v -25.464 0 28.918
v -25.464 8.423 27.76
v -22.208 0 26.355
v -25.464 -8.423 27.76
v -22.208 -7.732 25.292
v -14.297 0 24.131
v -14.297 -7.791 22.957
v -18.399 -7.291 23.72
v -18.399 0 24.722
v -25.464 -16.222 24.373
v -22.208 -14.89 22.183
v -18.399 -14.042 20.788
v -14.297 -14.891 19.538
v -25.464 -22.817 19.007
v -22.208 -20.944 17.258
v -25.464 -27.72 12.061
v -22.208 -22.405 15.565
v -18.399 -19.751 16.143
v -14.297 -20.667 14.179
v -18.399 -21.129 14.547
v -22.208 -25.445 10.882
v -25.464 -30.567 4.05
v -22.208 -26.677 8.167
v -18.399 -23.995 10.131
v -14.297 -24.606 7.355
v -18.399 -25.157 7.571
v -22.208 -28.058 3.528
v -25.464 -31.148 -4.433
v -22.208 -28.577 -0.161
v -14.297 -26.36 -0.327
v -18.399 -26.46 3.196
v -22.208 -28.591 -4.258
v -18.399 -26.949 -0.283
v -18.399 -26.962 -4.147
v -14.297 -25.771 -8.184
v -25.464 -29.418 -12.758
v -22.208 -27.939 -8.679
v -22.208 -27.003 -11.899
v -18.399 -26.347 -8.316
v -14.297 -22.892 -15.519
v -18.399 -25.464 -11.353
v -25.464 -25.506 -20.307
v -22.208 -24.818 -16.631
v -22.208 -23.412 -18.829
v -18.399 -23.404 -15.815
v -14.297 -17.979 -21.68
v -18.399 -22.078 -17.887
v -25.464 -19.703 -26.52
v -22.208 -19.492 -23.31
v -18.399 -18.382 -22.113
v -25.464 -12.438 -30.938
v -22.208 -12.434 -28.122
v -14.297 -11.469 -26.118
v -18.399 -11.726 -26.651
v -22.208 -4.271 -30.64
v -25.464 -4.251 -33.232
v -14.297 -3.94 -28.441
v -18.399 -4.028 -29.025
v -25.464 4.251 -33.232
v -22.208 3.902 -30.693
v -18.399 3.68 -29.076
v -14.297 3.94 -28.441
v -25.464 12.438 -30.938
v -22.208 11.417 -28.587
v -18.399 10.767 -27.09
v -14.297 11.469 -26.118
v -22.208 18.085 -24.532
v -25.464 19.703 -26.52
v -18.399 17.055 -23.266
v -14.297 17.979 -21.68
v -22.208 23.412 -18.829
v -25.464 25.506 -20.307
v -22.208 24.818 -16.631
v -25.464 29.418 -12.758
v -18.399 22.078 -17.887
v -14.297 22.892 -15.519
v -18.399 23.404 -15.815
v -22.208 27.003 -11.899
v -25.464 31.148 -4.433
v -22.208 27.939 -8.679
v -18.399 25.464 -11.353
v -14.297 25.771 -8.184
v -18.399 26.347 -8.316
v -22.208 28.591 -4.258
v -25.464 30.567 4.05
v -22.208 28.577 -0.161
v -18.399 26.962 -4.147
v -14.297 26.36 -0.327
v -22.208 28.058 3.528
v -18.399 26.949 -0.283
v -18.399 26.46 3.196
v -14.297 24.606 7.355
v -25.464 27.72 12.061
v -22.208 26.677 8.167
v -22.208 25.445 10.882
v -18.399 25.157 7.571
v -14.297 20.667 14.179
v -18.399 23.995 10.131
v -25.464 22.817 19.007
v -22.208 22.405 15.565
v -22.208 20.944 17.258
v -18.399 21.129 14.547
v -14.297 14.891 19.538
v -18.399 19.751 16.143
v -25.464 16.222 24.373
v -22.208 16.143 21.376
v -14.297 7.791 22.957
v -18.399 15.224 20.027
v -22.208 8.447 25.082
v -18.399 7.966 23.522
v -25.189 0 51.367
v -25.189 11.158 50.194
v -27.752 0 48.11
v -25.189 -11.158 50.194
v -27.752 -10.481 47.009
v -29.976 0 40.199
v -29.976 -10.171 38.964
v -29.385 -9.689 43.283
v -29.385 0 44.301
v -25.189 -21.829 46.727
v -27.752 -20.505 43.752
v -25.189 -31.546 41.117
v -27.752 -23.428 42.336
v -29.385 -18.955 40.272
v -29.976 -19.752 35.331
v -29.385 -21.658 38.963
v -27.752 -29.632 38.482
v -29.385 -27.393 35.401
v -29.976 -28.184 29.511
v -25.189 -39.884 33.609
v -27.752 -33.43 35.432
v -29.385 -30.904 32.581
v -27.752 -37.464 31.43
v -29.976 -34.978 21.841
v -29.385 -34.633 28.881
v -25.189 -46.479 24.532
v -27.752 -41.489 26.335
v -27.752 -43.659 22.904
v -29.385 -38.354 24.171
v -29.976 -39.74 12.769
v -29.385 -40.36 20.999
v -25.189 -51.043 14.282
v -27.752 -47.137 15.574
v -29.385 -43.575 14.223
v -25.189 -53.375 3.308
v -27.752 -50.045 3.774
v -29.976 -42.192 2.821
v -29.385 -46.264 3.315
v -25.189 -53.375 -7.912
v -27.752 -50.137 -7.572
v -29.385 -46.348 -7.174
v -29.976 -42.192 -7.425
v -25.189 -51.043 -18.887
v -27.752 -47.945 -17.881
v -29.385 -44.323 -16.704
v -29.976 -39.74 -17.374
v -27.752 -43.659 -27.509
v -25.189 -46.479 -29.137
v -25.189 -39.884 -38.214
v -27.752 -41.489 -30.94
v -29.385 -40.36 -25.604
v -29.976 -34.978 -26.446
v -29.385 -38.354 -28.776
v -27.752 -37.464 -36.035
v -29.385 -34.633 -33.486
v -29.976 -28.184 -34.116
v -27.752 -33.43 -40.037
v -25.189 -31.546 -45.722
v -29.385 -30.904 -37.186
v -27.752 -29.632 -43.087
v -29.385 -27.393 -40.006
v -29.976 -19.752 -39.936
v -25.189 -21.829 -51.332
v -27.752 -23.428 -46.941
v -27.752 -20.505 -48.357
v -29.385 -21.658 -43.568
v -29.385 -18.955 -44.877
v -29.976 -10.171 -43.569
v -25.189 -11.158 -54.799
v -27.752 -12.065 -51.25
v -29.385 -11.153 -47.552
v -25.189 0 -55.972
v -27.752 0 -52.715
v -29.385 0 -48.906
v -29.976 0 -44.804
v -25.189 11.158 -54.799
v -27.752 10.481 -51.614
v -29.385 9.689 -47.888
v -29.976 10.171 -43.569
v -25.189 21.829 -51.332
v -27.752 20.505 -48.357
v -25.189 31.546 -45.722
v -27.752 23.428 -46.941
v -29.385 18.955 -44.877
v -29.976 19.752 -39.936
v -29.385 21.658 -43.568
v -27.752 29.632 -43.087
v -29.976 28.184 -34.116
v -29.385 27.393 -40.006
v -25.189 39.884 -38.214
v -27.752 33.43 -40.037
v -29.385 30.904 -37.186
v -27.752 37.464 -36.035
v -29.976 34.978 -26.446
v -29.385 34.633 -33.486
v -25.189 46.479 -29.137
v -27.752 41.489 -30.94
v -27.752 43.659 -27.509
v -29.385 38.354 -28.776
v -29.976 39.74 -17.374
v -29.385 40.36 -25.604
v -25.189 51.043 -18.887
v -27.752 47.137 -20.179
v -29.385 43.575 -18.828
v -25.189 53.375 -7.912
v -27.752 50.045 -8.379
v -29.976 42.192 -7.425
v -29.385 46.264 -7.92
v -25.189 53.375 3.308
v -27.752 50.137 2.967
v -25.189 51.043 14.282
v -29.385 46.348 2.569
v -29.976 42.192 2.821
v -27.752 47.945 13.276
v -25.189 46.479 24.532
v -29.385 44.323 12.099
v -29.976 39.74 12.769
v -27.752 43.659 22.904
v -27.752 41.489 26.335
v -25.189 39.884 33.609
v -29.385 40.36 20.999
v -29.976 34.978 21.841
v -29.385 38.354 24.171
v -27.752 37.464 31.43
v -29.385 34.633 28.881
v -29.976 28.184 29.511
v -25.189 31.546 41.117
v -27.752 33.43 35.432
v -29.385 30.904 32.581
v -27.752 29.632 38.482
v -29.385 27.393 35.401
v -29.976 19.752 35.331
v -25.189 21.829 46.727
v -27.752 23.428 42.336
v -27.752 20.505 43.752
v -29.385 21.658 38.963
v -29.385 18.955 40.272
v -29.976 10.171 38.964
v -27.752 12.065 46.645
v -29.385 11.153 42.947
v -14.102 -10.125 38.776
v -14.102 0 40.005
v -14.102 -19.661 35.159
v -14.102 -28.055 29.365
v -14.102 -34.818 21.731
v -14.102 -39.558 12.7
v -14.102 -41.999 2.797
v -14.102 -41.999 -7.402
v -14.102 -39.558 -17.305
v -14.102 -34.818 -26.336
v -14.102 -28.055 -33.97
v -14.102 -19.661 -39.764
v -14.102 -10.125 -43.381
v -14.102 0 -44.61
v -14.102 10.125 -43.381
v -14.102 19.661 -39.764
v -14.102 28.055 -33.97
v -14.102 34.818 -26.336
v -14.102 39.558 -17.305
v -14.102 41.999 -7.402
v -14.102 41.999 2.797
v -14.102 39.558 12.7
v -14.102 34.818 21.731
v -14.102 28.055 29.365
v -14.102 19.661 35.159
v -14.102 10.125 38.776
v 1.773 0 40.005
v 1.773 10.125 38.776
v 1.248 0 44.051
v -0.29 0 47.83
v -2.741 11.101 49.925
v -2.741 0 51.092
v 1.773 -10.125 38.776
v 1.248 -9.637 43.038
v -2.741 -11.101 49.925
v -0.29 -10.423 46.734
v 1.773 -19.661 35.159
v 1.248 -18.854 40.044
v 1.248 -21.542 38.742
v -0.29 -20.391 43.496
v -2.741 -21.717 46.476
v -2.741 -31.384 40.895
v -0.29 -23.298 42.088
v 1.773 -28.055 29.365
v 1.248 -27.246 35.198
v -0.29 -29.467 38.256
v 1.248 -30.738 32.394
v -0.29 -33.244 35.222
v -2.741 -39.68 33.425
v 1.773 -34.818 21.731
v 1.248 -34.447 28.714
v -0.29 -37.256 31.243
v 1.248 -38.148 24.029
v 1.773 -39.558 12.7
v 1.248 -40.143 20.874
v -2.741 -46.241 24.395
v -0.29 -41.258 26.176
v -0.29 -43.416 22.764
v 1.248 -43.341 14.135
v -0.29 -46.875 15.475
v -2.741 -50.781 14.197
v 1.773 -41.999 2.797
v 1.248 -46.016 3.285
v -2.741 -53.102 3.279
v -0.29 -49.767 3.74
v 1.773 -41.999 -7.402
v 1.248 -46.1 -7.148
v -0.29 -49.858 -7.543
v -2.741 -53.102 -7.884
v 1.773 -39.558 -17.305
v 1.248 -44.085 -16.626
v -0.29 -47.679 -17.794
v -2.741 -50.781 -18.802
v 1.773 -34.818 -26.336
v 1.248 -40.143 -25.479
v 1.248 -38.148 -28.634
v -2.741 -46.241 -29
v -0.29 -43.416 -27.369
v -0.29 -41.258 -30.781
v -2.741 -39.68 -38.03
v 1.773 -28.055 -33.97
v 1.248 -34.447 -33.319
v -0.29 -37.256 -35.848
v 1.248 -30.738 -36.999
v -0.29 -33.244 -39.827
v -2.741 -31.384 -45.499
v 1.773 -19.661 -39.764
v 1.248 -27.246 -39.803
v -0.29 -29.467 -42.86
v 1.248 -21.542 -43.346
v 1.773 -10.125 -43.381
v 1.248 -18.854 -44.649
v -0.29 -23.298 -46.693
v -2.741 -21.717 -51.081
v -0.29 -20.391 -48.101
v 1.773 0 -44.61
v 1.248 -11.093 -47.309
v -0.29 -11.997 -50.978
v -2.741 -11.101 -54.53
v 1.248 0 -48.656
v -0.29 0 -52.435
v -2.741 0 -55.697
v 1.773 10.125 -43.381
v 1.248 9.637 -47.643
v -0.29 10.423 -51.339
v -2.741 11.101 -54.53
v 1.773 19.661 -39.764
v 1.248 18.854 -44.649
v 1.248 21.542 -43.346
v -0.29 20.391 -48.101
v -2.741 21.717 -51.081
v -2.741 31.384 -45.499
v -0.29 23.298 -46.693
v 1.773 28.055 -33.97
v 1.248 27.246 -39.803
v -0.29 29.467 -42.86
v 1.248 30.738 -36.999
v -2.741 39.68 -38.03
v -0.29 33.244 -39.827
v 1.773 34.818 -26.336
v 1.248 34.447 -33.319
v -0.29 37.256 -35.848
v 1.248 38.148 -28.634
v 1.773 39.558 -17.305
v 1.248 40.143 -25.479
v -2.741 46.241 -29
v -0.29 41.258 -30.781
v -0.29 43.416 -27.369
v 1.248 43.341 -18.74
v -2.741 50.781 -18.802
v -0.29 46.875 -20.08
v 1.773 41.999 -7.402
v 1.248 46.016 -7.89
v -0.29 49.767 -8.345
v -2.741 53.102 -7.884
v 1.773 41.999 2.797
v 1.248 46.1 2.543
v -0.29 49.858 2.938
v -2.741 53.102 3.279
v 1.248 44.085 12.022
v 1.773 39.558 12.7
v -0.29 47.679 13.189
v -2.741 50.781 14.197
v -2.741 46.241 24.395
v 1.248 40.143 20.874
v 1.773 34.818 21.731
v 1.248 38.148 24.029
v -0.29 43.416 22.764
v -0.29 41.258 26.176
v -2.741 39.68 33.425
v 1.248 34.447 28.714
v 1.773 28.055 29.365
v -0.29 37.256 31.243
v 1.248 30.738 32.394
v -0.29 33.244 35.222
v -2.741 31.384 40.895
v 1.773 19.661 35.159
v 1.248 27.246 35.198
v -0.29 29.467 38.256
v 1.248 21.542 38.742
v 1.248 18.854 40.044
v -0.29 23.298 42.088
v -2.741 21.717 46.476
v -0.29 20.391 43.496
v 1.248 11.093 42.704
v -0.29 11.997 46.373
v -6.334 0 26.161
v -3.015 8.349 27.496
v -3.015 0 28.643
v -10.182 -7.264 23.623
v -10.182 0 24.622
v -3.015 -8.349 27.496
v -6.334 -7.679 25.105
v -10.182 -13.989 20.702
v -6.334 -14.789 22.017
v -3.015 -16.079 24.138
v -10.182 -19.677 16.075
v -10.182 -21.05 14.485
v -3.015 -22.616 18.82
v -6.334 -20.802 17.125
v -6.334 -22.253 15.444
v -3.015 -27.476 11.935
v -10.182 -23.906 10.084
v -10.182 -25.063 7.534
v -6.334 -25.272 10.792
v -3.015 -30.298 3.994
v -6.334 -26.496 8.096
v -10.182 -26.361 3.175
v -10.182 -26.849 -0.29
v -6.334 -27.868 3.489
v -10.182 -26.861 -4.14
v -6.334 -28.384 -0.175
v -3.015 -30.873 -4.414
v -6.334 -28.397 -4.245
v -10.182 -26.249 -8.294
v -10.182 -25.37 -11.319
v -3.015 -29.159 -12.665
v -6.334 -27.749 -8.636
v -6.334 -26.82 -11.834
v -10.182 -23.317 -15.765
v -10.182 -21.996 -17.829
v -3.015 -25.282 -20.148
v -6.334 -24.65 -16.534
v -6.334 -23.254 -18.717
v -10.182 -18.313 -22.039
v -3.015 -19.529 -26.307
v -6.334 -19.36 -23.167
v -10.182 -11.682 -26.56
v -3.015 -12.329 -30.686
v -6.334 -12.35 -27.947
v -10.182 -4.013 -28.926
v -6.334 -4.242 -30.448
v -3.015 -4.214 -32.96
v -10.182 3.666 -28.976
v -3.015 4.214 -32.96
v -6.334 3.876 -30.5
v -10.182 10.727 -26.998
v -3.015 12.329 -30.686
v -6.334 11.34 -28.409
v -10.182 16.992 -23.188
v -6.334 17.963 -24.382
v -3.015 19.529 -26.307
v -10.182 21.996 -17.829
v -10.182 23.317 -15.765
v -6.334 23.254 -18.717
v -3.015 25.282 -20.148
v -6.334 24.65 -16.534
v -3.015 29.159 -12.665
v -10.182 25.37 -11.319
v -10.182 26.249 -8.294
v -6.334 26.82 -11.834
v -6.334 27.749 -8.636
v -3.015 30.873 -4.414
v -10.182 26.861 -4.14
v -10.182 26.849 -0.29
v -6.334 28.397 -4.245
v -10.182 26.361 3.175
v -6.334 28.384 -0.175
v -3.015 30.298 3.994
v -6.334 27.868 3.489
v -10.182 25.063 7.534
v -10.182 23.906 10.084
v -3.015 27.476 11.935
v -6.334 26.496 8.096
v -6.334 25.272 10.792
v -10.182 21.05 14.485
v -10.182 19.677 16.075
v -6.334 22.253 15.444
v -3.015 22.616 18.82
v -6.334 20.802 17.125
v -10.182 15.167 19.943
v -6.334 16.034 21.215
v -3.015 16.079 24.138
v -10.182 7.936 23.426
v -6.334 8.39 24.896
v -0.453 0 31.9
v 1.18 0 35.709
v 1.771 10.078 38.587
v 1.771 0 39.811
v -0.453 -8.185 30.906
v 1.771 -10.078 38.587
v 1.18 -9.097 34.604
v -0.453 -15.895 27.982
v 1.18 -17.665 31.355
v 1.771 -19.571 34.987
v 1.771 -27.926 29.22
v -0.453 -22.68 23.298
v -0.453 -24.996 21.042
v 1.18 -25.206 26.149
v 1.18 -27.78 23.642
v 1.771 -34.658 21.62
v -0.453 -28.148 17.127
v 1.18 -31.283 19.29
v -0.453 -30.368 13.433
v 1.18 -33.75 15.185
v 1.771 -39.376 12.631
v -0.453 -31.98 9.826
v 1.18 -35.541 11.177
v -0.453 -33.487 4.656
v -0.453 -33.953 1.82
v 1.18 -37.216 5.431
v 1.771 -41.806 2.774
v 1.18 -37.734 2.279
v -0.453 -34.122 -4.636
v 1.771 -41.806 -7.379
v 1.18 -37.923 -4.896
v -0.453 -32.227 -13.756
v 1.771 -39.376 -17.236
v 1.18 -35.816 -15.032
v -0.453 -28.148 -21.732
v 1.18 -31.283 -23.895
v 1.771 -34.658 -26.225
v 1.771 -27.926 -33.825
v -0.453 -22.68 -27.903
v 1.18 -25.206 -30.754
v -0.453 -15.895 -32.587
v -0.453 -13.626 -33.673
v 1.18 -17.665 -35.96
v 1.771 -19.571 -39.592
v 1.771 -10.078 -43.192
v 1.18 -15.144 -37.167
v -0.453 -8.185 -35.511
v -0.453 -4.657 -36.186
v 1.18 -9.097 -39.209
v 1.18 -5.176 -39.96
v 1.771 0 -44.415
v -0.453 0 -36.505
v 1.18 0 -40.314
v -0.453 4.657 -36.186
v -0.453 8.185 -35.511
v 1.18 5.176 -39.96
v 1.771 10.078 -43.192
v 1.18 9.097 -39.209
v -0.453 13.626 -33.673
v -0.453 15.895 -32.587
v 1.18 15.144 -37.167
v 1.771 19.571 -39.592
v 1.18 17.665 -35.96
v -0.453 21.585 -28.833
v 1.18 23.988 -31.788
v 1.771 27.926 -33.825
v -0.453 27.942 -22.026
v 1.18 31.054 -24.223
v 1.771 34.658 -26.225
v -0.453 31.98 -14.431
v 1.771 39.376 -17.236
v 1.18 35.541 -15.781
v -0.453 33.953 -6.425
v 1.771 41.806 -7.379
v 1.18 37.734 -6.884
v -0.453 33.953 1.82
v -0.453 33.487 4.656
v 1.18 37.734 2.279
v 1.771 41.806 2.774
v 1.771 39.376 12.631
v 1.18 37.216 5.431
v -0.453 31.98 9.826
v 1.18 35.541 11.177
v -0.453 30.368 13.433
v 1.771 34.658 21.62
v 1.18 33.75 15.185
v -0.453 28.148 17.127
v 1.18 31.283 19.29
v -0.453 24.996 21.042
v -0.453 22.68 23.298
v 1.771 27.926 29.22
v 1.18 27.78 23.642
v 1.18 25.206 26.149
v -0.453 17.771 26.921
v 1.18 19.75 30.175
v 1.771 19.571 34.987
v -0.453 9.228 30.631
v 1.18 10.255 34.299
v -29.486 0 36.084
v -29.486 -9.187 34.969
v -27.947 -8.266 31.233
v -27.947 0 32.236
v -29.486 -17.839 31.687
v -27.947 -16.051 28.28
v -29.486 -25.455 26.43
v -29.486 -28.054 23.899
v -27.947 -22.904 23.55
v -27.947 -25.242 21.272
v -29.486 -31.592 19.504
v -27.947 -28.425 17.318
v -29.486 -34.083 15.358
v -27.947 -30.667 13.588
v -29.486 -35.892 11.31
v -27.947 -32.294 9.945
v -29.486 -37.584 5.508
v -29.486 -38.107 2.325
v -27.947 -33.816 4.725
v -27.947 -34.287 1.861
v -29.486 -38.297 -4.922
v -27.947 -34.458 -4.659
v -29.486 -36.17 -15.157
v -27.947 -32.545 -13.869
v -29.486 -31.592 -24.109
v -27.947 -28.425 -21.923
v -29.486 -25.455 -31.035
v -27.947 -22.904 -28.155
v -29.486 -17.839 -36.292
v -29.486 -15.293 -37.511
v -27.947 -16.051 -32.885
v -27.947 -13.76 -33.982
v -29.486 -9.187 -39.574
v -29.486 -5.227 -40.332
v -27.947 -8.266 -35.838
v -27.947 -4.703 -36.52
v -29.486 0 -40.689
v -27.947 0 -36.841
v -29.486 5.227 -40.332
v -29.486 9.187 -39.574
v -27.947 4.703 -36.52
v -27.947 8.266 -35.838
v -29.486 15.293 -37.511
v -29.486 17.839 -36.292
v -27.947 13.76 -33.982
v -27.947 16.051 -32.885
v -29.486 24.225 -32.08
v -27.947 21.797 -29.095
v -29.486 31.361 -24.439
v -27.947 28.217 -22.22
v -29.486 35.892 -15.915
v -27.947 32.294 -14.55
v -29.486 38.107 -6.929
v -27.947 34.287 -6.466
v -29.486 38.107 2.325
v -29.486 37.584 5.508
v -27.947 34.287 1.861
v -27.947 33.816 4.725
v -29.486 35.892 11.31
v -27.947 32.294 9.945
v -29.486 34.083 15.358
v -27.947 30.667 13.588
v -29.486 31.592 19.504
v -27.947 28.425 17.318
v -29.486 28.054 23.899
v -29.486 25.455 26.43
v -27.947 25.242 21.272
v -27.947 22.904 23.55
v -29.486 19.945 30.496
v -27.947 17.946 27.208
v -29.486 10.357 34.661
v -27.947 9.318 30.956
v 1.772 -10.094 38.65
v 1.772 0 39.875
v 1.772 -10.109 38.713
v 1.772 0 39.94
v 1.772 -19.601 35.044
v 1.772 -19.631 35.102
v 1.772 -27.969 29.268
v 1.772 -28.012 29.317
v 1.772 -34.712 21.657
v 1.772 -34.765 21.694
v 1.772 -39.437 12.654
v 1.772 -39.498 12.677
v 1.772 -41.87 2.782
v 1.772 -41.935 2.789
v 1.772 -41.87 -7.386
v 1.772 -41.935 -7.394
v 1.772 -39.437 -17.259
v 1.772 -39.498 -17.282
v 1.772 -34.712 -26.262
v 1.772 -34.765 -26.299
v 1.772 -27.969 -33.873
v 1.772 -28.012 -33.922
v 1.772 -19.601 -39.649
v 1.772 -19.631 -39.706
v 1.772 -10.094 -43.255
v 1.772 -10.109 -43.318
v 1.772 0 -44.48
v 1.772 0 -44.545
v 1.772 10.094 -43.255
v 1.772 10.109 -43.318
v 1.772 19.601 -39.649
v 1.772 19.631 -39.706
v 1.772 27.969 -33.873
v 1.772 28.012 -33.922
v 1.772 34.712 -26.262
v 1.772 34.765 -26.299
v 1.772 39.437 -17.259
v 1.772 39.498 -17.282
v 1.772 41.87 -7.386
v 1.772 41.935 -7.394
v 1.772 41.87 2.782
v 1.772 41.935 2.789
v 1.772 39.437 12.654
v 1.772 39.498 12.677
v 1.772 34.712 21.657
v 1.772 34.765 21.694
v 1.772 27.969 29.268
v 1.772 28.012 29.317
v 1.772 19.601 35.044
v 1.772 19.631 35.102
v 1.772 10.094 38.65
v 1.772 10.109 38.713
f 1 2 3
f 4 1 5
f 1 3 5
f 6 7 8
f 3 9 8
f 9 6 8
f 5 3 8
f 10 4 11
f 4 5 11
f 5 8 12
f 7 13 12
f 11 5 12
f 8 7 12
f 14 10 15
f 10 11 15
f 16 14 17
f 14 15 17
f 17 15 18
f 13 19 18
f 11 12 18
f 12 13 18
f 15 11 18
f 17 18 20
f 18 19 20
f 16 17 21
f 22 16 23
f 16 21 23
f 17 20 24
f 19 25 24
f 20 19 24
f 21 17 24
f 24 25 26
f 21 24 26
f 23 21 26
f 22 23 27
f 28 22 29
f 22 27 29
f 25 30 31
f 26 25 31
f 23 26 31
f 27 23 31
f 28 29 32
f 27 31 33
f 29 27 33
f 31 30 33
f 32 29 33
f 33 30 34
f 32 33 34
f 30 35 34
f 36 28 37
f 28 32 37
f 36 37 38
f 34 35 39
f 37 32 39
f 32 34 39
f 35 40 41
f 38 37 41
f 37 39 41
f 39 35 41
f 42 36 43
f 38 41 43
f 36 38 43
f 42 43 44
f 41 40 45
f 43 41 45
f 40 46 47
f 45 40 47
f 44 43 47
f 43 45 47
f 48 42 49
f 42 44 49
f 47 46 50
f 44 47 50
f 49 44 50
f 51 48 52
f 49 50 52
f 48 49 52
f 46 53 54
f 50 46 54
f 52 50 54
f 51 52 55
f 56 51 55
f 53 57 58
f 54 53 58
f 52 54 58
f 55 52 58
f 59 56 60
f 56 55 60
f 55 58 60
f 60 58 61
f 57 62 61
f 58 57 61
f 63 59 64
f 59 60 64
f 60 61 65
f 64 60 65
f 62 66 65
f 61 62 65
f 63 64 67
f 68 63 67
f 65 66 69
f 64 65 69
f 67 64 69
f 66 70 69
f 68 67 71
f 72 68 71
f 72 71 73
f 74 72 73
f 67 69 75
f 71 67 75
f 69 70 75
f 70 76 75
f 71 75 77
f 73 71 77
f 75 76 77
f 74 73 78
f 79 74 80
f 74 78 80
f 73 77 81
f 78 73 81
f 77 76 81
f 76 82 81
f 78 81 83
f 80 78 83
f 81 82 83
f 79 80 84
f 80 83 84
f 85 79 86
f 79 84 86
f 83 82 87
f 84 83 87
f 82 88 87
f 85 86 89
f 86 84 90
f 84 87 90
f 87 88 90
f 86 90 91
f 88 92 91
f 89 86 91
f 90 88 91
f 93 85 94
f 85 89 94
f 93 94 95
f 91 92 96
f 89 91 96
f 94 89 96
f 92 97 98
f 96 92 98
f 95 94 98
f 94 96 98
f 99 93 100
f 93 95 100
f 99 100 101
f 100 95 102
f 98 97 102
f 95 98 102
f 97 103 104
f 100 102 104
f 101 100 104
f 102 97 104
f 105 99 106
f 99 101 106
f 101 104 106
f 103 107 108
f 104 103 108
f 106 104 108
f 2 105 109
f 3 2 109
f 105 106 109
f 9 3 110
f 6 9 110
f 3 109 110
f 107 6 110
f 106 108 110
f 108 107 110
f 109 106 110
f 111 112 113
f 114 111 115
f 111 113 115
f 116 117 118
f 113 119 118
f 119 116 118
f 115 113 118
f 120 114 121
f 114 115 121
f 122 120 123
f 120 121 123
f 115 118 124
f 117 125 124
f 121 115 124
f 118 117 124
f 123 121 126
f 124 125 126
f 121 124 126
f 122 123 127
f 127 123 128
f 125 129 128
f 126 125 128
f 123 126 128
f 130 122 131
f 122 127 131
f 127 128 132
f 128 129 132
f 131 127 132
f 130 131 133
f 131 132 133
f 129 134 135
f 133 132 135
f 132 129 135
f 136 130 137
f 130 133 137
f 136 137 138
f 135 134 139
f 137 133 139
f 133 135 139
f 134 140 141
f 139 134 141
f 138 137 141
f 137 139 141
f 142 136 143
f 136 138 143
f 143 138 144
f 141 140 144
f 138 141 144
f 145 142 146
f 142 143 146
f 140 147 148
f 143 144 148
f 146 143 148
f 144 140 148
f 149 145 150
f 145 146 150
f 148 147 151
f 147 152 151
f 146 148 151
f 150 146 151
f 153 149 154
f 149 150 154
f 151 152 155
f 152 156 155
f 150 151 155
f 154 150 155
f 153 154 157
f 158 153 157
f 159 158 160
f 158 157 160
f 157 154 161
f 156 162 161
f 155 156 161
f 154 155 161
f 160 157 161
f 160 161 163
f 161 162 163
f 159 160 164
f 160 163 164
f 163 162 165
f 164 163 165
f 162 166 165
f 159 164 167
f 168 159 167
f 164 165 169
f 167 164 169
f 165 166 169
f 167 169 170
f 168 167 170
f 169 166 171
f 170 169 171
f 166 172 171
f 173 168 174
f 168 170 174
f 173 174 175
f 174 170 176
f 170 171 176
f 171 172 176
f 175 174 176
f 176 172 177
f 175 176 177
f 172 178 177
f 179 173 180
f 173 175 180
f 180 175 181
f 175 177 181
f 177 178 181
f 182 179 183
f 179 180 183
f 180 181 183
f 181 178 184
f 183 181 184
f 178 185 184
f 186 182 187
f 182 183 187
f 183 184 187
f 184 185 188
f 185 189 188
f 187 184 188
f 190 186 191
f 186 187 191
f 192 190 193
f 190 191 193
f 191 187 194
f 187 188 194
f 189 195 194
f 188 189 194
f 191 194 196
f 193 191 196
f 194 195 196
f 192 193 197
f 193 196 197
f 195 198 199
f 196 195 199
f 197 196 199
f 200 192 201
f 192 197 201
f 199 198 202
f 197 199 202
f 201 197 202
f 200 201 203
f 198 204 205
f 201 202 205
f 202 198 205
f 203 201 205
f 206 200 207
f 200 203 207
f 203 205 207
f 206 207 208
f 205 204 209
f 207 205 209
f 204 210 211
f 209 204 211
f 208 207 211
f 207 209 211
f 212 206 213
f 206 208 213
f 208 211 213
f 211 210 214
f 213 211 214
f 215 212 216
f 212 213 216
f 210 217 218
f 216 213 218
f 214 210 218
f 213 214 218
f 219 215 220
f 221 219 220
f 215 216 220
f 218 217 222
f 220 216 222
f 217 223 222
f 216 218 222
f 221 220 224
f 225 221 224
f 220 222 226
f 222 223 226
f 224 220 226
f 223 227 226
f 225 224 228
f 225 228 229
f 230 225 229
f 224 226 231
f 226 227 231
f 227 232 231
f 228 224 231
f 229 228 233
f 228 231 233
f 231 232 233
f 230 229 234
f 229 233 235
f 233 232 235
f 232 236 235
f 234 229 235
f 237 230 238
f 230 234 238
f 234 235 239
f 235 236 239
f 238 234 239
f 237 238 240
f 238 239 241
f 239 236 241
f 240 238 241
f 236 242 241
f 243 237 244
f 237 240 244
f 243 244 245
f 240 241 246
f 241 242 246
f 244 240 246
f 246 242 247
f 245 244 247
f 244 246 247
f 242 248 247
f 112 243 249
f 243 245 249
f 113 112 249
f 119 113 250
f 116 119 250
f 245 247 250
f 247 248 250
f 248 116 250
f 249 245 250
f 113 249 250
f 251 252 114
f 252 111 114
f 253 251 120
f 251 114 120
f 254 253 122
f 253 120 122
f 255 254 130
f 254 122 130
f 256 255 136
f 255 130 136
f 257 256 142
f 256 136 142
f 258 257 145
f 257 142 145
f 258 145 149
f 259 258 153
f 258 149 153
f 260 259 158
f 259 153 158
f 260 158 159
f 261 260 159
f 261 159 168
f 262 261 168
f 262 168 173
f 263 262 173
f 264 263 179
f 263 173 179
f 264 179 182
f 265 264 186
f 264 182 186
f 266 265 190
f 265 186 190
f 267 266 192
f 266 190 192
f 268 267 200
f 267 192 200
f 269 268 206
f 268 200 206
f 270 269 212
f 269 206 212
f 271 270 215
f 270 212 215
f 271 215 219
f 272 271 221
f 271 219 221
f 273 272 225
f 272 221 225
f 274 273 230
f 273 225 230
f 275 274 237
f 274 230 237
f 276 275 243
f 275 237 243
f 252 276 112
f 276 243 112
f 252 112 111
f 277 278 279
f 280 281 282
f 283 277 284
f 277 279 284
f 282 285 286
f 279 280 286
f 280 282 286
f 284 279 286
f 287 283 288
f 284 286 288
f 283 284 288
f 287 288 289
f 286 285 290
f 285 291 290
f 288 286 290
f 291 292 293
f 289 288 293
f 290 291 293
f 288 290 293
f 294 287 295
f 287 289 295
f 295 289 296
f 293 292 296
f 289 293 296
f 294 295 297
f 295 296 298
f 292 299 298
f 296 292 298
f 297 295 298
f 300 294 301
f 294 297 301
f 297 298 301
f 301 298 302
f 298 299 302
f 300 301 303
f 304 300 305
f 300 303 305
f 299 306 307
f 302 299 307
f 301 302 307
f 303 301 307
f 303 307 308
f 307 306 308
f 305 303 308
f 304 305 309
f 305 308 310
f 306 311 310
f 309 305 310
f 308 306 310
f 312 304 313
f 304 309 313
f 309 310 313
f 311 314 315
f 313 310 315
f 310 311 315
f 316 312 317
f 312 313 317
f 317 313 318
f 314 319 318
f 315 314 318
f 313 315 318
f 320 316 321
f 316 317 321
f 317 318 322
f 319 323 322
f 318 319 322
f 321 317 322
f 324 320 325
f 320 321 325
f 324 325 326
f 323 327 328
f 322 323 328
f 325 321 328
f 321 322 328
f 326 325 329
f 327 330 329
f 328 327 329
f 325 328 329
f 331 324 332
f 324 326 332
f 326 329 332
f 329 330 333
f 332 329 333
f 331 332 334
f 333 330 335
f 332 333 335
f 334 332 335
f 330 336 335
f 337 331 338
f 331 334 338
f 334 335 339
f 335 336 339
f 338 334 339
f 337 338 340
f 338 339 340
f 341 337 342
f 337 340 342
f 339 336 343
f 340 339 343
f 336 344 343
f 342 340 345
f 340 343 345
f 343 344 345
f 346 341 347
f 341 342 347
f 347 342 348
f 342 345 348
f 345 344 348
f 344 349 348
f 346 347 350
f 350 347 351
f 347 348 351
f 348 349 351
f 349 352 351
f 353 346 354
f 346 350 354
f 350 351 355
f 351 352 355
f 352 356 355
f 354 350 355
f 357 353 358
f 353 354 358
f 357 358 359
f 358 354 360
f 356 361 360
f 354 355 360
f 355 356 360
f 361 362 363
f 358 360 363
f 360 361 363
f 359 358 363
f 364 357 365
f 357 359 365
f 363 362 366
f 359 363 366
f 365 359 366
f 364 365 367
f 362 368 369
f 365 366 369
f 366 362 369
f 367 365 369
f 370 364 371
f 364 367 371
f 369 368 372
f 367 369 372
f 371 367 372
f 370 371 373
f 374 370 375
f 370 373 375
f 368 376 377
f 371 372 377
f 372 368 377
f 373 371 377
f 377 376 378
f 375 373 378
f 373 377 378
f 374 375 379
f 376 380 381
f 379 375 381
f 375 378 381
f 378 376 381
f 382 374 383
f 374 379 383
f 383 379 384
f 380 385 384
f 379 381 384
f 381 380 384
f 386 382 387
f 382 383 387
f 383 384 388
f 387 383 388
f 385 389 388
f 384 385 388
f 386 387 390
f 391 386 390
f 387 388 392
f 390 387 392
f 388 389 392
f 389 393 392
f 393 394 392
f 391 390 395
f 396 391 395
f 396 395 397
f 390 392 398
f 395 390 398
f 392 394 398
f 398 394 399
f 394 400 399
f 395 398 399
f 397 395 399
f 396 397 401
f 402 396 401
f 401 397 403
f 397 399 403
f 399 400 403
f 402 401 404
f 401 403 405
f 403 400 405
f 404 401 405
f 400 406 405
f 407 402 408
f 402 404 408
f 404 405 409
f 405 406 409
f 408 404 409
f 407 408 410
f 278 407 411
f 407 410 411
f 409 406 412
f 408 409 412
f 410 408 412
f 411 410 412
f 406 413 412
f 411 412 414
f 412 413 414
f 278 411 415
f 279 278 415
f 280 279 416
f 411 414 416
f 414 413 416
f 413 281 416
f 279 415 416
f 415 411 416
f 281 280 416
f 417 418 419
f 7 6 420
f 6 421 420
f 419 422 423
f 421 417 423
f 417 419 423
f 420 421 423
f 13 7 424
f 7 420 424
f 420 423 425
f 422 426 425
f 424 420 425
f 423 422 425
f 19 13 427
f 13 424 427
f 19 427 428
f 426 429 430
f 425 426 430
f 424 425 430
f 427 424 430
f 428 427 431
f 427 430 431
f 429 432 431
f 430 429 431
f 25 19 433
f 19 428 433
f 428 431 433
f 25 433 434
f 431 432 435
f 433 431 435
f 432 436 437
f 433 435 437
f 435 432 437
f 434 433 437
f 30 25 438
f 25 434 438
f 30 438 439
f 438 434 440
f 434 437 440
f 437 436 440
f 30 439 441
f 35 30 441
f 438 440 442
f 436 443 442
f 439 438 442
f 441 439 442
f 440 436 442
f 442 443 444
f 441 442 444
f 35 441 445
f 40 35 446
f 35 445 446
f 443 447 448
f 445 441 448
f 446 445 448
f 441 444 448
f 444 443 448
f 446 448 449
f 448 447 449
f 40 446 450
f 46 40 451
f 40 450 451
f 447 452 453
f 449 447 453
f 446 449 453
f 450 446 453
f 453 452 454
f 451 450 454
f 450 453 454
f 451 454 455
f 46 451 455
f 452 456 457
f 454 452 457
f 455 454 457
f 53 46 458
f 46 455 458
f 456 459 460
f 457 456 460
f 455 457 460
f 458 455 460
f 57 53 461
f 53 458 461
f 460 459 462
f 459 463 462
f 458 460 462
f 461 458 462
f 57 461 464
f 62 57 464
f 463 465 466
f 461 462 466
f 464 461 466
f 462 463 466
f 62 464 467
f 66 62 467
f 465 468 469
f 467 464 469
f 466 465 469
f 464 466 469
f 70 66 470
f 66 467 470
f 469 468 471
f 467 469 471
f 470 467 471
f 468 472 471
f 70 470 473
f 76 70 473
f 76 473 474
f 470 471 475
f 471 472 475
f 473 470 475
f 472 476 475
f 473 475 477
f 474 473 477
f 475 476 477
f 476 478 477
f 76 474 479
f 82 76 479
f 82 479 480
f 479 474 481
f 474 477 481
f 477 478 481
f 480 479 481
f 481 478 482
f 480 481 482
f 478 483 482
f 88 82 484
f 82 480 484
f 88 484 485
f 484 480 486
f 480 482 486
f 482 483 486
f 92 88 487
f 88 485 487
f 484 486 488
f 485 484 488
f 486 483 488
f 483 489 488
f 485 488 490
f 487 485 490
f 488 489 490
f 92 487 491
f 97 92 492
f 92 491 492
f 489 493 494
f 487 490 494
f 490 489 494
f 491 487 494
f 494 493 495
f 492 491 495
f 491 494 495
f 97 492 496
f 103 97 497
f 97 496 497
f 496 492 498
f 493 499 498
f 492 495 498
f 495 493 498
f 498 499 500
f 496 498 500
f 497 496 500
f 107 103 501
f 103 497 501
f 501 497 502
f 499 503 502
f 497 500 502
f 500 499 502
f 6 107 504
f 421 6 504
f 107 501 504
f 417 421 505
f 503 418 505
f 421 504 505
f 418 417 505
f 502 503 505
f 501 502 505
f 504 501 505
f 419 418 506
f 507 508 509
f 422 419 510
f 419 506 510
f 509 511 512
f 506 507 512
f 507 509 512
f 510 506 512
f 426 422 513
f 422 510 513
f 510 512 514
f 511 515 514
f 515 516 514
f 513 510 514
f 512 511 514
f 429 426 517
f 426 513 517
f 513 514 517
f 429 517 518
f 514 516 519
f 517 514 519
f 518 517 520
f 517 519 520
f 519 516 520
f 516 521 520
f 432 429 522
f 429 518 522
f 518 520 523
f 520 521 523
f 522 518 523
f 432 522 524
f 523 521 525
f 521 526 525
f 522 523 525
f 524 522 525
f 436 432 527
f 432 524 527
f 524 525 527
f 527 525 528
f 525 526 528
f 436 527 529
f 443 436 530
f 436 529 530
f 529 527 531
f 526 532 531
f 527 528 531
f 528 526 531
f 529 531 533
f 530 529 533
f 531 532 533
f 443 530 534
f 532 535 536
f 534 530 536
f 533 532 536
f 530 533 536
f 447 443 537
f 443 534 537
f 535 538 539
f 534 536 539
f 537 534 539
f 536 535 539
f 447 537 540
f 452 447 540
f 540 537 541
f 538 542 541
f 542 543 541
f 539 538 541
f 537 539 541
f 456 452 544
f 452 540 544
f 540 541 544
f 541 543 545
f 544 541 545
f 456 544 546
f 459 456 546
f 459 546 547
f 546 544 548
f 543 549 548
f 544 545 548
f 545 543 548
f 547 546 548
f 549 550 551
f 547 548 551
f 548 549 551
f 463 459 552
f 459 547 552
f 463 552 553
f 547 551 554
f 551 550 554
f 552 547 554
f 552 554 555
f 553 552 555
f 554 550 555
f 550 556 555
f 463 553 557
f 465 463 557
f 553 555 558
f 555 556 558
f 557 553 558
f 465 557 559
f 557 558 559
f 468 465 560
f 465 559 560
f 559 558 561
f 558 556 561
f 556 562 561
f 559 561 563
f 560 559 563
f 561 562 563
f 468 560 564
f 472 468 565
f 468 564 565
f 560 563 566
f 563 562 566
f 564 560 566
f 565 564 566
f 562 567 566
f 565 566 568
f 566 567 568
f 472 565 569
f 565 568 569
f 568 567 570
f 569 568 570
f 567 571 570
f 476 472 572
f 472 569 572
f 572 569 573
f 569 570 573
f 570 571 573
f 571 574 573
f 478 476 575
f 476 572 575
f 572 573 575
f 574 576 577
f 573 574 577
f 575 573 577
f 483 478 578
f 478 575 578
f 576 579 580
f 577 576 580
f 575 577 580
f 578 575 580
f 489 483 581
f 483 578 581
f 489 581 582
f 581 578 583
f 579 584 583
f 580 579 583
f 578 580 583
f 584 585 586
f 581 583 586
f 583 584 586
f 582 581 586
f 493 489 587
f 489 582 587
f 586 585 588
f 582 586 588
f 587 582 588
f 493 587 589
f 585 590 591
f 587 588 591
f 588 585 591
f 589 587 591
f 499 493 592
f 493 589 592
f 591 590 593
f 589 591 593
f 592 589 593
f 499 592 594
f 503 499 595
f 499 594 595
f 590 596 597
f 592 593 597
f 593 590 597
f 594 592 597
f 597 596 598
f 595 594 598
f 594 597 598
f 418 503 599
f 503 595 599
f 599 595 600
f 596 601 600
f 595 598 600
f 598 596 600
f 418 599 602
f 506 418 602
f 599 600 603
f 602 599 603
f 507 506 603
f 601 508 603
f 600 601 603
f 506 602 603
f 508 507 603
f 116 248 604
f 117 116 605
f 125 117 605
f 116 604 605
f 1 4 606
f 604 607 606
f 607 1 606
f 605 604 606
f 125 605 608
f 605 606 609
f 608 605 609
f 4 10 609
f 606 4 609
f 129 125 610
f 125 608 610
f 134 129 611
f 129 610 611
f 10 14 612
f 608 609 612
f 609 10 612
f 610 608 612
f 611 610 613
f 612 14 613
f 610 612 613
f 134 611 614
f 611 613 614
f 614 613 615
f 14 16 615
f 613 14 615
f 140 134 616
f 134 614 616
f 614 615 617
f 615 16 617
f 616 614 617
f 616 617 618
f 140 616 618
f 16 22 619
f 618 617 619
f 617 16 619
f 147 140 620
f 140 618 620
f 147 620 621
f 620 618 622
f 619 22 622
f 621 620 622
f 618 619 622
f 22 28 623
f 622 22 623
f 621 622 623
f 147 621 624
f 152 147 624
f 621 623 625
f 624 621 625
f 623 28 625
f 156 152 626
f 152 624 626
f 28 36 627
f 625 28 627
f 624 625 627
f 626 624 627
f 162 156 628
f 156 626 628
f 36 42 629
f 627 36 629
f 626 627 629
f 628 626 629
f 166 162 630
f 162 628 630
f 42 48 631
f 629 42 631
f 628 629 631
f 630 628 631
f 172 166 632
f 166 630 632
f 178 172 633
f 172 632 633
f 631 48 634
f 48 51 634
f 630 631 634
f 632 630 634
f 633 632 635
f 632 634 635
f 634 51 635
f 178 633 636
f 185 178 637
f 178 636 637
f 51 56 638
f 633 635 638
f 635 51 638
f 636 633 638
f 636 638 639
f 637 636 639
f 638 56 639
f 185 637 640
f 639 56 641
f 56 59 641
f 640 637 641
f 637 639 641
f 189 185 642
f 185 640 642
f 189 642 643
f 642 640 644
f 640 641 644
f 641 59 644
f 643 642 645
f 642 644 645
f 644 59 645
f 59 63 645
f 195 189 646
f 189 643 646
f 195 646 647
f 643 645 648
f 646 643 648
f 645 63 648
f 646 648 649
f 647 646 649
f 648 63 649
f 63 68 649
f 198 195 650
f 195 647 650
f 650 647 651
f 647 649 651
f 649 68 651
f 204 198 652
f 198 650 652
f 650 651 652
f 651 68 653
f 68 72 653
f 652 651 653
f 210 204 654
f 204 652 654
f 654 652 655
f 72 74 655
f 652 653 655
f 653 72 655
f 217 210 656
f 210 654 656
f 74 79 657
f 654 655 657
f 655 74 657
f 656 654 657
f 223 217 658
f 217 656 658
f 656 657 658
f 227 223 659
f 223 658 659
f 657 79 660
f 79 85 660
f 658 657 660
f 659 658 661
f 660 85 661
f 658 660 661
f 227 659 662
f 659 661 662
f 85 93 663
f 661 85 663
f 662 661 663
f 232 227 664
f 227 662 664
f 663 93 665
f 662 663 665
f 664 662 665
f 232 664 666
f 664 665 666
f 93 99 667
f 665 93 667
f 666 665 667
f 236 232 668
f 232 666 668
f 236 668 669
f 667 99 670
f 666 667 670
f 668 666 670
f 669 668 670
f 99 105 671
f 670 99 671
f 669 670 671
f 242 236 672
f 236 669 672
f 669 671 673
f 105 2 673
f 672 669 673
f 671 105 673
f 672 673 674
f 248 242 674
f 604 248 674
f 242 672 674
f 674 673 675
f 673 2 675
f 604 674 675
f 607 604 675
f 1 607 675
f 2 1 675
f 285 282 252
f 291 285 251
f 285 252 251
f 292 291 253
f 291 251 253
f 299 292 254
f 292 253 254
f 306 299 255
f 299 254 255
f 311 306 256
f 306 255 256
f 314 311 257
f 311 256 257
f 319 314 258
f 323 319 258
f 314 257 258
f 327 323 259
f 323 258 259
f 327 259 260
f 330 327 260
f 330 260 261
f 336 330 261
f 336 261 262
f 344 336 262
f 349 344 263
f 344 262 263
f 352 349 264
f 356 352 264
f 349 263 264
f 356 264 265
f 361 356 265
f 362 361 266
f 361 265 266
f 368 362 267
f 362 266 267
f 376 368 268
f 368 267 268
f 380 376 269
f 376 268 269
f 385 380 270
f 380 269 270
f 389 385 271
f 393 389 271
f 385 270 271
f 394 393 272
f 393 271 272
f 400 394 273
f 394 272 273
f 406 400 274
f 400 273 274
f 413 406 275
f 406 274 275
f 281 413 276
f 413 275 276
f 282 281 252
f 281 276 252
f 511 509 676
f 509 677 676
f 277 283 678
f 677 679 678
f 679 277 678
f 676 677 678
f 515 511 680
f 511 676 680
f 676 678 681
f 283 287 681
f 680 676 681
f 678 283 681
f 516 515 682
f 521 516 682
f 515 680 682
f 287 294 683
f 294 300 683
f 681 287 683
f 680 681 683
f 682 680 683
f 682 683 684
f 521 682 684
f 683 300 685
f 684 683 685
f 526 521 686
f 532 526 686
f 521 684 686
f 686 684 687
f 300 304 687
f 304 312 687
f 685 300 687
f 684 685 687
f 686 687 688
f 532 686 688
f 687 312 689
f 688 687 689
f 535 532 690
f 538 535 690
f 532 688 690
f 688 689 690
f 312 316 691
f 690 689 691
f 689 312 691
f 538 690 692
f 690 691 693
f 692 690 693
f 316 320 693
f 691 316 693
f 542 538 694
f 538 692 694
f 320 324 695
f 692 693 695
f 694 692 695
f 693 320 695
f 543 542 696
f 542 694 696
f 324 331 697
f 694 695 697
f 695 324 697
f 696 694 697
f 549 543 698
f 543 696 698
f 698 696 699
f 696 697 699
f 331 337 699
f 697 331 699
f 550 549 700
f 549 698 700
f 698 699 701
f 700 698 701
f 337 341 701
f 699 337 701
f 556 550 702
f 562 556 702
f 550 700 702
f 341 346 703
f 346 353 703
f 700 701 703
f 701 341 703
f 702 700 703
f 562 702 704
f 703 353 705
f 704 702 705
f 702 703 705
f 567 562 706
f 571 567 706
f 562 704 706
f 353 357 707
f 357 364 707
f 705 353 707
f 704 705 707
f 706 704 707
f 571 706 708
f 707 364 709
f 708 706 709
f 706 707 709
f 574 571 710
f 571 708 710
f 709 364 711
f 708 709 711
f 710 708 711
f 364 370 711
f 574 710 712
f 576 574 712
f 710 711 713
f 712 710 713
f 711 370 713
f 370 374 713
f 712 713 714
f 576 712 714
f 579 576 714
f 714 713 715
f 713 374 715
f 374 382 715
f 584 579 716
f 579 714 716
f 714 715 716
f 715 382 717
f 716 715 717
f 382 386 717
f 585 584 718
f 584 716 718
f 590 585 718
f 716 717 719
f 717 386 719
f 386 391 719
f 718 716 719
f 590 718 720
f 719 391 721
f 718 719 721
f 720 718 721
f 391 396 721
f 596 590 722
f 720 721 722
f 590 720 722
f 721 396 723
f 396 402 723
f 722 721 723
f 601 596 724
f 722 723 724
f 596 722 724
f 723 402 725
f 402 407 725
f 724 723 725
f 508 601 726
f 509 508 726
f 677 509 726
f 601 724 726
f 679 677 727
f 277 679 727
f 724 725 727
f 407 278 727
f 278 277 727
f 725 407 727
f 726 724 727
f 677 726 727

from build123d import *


with BuildPart() as f1:
    # F0 (on Front) → F1 (revolve)
    with BuildSketch(Plane.XZ):
        with BuildLine():
            Line((-3.015464, 28.643063), (-14.102481, 40.005002))
            Line((-14.102481, 40.005002), (-14.29688, 24.131192))
            ThreePointArc((-14.29688, 24.131192), (-8.207439, 25.265121), (-3.015464, 28.643063))
        make_face()
        with BuildLine():
            Line((-14.29688, 24.131192), (-14.102481, 40.005002))
            Line((-14.102481, 40.005002), (-25.464421, 28.917985))
            ThreePointArc((-25.464421, 28.917985), (-20.356727, 25.413908), (-14.29688, 24.131192))
        make_face()
        with BuildLine():
            Line((-29.976291, 40.199401), (-14.102481, 40.005002))
            Line((-14.102481, 40.005002), (-25.189499, 51.366942))
            ThreePointArc((-25.189499, 51.366942), (-28.693576, 46.259247), (-29.976291, 40.199401))
        make_face()
        with BuildLine():
            Line((-25.464421, 28.917985), (-14.102481, 40.005002))
            Line((-14.102481, 40.005002), (-29.976291, 40.199401))
            ThreePointArc((-29.976291, 40.199401), (-28.842362, 34.109959), (-25.464421, 28.917985))
        make_face()
        with BuildLine():
            ThreePointArc((-3.015464, 28.643063), (0.488613, 33.750757), (1.771328, 39.810603))
            Line((1.771328, 39.810603), (-14.102481, 40.005002))
            Line((-14.102481, 40.005002), (-3.015464, 28.643063))
        make_face()
        with BuildLine():
            ThreePointArc((1.771328, 39.810603), (1.772221, 39.907801), (1.772519, 40.005002))
            ThreePointArc((1.772519, 40.005002), (0.601029, 45.990185), (-2.740542, 51.09202))
            Line((-2.740542, 51.09202), (-14.102481, 40.005002))
            Line((-14.102481, 40.005002), (1.771328, 39.810603))
        make_face()
    revolve(axis=Axis((-0.097199, 0, -2.302446), (1, 0, 0)))


solid = f1.part
